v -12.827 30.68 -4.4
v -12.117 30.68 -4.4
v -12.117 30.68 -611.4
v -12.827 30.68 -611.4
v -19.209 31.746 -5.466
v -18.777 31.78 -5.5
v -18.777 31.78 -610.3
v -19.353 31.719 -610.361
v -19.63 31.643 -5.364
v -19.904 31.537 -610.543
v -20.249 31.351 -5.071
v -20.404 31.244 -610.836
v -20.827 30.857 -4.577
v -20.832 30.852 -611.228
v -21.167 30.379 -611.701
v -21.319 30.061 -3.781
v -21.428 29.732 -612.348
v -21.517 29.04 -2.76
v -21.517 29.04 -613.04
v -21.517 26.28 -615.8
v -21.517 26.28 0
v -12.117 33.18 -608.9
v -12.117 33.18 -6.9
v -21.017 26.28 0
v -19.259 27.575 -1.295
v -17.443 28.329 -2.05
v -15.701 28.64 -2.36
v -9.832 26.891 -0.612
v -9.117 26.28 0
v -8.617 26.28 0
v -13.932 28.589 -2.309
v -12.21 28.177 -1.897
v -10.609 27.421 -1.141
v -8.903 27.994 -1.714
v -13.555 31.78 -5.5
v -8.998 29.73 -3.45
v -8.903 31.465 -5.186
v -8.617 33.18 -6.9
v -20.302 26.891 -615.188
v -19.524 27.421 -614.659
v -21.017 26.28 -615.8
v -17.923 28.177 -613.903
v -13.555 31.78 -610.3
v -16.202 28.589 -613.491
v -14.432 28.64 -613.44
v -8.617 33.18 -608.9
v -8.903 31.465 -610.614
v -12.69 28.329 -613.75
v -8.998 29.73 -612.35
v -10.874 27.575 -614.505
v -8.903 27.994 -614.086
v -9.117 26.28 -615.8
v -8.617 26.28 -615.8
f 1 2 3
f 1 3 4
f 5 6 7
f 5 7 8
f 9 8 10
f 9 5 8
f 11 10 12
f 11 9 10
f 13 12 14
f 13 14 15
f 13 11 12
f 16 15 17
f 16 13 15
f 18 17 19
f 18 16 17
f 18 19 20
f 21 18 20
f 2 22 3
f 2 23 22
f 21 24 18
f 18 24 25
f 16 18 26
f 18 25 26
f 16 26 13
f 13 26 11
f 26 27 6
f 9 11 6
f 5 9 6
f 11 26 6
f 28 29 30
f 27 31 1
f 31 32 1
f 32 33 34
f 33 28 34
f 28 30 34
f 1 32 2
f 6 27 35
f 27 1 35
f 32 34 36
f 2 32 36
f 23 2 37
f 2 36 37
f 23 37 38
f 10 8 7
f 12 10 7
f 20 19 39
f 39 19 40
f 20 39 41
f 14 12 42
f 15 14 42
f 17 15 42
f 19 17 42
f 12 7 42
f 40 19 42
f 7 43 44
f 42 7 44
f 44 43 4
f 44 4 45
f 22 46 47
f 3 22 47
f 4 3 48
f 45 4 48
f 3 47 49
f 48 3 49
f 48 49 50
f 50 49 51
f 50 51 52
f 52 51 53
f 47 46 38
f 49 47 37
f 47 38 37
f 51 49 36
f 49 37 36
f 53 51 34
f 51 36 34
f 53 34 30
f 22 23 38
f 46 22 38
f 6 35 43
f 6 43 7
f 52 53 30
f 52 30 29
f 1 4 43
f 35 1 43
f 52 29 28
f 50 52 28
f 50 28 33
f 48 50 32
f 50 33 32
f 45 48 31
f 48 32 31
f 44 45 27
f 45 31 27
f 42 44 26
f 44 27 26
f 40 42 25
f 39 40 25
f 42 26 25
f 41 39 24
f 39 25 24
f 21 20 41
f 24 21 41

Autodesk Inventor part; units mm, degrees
ref_plane "YZ Plane" through (0, 0, 0) normal (1, 0, 0) x (0, 1, 0)
sketch "Boceto3" plane through (0, 0, 0) normal (0, 0, 1) x (1, 0, 0)
  line L0 (-13.5546, 31.7799) -> (-18.7766, 31.7799)
  line L1 (-12.1166, 33.1799) -> (-12.1166, 30.6799)
  line L2 (-12.1166, 30.6799) -> (-12.8266, 30.6799)
  line L3 (-12.8266, 30.6799) -> (-13.5546, 31.7799)
  arc A0 (-18.7766, 31.7799) -> (-21.5166, 29.0399) centre (-18.7766, 29.0399) ccw
  line L4 (-12.1166, 33.1799) -> (-8.6166, 33.1799)
  line L5 (-21.5166, 29.0399) -> (-21.5166, 26.2799)
  arc A1 (-8.6166, 33.1799) -> (-8.6166, 26.2799) centre (6.7872, 29.7299) ccw
  line L6 (-21.5166, 26.2799) -> (-21.0166, 26.2799)
  line L7 (-8.6166, 26.2799) -> (-9.1166, 26.2799)
  line L8 (-8.6166, 38.7215) -> (-8.6166, 22.0906) construction
  arc A2 (-9.1166, 26.2799) -> (-21.0166, 26.2799) centre (-15.0666, 20.0463) ccw
  dimension "d218" = 2.5
  dimension "d219" = 0.71
  dimension "d221" = 33.5
  dimension "d223" = 2.74
  dimension "d281" = 3.5
  dimension "d288" = 2.76
  dimension "d291" = 0.5
  dimension "d292" = 0.5
  dimension "d301" = 5.2219
extrude "Extrusión4" add sketch "Boceto3" against normal blind 615.8
ref_plane "Plano de trabajo1" through (-8.6166, 33.1799, 0) normal (-1, 0, 0) x (0, 0, -1)
ref_plane "Plano de trabajo2" through (0, 0, -307.9) normal (0, 0, 1) x (1, 0, 0)
sketch "Boceto5" plane through (-8.6166, 33.1799, 0) normal (-1, 0, 0) x (0, 0, -1)
  line L0 (0, 0) -> (0, 6.9) projected
  line L1 (0, 0) -> (615.8, 0) projected
  line L2 (6.9, 0) -> (0, 0)
  line L3 (0, 0) -> (0, 6.9)
  line L4 (0, 6.9) -> (615.8, 6.9) projected
  line L5 (0, 6.9) -> (6.9, 0)
  point P0 (0, 0)
  dimension "d300" = 45
extrude "Extrusión6" cut sketch "Boceto5" along normal through all
mirror "Simetría3" about plane through (0, 0, -307.9) normal (0, 0, 1) of "Extrusión6"
properties part number "SP40-02 JUNTA INT CRISTAL 761 mm" material "Caucho"
